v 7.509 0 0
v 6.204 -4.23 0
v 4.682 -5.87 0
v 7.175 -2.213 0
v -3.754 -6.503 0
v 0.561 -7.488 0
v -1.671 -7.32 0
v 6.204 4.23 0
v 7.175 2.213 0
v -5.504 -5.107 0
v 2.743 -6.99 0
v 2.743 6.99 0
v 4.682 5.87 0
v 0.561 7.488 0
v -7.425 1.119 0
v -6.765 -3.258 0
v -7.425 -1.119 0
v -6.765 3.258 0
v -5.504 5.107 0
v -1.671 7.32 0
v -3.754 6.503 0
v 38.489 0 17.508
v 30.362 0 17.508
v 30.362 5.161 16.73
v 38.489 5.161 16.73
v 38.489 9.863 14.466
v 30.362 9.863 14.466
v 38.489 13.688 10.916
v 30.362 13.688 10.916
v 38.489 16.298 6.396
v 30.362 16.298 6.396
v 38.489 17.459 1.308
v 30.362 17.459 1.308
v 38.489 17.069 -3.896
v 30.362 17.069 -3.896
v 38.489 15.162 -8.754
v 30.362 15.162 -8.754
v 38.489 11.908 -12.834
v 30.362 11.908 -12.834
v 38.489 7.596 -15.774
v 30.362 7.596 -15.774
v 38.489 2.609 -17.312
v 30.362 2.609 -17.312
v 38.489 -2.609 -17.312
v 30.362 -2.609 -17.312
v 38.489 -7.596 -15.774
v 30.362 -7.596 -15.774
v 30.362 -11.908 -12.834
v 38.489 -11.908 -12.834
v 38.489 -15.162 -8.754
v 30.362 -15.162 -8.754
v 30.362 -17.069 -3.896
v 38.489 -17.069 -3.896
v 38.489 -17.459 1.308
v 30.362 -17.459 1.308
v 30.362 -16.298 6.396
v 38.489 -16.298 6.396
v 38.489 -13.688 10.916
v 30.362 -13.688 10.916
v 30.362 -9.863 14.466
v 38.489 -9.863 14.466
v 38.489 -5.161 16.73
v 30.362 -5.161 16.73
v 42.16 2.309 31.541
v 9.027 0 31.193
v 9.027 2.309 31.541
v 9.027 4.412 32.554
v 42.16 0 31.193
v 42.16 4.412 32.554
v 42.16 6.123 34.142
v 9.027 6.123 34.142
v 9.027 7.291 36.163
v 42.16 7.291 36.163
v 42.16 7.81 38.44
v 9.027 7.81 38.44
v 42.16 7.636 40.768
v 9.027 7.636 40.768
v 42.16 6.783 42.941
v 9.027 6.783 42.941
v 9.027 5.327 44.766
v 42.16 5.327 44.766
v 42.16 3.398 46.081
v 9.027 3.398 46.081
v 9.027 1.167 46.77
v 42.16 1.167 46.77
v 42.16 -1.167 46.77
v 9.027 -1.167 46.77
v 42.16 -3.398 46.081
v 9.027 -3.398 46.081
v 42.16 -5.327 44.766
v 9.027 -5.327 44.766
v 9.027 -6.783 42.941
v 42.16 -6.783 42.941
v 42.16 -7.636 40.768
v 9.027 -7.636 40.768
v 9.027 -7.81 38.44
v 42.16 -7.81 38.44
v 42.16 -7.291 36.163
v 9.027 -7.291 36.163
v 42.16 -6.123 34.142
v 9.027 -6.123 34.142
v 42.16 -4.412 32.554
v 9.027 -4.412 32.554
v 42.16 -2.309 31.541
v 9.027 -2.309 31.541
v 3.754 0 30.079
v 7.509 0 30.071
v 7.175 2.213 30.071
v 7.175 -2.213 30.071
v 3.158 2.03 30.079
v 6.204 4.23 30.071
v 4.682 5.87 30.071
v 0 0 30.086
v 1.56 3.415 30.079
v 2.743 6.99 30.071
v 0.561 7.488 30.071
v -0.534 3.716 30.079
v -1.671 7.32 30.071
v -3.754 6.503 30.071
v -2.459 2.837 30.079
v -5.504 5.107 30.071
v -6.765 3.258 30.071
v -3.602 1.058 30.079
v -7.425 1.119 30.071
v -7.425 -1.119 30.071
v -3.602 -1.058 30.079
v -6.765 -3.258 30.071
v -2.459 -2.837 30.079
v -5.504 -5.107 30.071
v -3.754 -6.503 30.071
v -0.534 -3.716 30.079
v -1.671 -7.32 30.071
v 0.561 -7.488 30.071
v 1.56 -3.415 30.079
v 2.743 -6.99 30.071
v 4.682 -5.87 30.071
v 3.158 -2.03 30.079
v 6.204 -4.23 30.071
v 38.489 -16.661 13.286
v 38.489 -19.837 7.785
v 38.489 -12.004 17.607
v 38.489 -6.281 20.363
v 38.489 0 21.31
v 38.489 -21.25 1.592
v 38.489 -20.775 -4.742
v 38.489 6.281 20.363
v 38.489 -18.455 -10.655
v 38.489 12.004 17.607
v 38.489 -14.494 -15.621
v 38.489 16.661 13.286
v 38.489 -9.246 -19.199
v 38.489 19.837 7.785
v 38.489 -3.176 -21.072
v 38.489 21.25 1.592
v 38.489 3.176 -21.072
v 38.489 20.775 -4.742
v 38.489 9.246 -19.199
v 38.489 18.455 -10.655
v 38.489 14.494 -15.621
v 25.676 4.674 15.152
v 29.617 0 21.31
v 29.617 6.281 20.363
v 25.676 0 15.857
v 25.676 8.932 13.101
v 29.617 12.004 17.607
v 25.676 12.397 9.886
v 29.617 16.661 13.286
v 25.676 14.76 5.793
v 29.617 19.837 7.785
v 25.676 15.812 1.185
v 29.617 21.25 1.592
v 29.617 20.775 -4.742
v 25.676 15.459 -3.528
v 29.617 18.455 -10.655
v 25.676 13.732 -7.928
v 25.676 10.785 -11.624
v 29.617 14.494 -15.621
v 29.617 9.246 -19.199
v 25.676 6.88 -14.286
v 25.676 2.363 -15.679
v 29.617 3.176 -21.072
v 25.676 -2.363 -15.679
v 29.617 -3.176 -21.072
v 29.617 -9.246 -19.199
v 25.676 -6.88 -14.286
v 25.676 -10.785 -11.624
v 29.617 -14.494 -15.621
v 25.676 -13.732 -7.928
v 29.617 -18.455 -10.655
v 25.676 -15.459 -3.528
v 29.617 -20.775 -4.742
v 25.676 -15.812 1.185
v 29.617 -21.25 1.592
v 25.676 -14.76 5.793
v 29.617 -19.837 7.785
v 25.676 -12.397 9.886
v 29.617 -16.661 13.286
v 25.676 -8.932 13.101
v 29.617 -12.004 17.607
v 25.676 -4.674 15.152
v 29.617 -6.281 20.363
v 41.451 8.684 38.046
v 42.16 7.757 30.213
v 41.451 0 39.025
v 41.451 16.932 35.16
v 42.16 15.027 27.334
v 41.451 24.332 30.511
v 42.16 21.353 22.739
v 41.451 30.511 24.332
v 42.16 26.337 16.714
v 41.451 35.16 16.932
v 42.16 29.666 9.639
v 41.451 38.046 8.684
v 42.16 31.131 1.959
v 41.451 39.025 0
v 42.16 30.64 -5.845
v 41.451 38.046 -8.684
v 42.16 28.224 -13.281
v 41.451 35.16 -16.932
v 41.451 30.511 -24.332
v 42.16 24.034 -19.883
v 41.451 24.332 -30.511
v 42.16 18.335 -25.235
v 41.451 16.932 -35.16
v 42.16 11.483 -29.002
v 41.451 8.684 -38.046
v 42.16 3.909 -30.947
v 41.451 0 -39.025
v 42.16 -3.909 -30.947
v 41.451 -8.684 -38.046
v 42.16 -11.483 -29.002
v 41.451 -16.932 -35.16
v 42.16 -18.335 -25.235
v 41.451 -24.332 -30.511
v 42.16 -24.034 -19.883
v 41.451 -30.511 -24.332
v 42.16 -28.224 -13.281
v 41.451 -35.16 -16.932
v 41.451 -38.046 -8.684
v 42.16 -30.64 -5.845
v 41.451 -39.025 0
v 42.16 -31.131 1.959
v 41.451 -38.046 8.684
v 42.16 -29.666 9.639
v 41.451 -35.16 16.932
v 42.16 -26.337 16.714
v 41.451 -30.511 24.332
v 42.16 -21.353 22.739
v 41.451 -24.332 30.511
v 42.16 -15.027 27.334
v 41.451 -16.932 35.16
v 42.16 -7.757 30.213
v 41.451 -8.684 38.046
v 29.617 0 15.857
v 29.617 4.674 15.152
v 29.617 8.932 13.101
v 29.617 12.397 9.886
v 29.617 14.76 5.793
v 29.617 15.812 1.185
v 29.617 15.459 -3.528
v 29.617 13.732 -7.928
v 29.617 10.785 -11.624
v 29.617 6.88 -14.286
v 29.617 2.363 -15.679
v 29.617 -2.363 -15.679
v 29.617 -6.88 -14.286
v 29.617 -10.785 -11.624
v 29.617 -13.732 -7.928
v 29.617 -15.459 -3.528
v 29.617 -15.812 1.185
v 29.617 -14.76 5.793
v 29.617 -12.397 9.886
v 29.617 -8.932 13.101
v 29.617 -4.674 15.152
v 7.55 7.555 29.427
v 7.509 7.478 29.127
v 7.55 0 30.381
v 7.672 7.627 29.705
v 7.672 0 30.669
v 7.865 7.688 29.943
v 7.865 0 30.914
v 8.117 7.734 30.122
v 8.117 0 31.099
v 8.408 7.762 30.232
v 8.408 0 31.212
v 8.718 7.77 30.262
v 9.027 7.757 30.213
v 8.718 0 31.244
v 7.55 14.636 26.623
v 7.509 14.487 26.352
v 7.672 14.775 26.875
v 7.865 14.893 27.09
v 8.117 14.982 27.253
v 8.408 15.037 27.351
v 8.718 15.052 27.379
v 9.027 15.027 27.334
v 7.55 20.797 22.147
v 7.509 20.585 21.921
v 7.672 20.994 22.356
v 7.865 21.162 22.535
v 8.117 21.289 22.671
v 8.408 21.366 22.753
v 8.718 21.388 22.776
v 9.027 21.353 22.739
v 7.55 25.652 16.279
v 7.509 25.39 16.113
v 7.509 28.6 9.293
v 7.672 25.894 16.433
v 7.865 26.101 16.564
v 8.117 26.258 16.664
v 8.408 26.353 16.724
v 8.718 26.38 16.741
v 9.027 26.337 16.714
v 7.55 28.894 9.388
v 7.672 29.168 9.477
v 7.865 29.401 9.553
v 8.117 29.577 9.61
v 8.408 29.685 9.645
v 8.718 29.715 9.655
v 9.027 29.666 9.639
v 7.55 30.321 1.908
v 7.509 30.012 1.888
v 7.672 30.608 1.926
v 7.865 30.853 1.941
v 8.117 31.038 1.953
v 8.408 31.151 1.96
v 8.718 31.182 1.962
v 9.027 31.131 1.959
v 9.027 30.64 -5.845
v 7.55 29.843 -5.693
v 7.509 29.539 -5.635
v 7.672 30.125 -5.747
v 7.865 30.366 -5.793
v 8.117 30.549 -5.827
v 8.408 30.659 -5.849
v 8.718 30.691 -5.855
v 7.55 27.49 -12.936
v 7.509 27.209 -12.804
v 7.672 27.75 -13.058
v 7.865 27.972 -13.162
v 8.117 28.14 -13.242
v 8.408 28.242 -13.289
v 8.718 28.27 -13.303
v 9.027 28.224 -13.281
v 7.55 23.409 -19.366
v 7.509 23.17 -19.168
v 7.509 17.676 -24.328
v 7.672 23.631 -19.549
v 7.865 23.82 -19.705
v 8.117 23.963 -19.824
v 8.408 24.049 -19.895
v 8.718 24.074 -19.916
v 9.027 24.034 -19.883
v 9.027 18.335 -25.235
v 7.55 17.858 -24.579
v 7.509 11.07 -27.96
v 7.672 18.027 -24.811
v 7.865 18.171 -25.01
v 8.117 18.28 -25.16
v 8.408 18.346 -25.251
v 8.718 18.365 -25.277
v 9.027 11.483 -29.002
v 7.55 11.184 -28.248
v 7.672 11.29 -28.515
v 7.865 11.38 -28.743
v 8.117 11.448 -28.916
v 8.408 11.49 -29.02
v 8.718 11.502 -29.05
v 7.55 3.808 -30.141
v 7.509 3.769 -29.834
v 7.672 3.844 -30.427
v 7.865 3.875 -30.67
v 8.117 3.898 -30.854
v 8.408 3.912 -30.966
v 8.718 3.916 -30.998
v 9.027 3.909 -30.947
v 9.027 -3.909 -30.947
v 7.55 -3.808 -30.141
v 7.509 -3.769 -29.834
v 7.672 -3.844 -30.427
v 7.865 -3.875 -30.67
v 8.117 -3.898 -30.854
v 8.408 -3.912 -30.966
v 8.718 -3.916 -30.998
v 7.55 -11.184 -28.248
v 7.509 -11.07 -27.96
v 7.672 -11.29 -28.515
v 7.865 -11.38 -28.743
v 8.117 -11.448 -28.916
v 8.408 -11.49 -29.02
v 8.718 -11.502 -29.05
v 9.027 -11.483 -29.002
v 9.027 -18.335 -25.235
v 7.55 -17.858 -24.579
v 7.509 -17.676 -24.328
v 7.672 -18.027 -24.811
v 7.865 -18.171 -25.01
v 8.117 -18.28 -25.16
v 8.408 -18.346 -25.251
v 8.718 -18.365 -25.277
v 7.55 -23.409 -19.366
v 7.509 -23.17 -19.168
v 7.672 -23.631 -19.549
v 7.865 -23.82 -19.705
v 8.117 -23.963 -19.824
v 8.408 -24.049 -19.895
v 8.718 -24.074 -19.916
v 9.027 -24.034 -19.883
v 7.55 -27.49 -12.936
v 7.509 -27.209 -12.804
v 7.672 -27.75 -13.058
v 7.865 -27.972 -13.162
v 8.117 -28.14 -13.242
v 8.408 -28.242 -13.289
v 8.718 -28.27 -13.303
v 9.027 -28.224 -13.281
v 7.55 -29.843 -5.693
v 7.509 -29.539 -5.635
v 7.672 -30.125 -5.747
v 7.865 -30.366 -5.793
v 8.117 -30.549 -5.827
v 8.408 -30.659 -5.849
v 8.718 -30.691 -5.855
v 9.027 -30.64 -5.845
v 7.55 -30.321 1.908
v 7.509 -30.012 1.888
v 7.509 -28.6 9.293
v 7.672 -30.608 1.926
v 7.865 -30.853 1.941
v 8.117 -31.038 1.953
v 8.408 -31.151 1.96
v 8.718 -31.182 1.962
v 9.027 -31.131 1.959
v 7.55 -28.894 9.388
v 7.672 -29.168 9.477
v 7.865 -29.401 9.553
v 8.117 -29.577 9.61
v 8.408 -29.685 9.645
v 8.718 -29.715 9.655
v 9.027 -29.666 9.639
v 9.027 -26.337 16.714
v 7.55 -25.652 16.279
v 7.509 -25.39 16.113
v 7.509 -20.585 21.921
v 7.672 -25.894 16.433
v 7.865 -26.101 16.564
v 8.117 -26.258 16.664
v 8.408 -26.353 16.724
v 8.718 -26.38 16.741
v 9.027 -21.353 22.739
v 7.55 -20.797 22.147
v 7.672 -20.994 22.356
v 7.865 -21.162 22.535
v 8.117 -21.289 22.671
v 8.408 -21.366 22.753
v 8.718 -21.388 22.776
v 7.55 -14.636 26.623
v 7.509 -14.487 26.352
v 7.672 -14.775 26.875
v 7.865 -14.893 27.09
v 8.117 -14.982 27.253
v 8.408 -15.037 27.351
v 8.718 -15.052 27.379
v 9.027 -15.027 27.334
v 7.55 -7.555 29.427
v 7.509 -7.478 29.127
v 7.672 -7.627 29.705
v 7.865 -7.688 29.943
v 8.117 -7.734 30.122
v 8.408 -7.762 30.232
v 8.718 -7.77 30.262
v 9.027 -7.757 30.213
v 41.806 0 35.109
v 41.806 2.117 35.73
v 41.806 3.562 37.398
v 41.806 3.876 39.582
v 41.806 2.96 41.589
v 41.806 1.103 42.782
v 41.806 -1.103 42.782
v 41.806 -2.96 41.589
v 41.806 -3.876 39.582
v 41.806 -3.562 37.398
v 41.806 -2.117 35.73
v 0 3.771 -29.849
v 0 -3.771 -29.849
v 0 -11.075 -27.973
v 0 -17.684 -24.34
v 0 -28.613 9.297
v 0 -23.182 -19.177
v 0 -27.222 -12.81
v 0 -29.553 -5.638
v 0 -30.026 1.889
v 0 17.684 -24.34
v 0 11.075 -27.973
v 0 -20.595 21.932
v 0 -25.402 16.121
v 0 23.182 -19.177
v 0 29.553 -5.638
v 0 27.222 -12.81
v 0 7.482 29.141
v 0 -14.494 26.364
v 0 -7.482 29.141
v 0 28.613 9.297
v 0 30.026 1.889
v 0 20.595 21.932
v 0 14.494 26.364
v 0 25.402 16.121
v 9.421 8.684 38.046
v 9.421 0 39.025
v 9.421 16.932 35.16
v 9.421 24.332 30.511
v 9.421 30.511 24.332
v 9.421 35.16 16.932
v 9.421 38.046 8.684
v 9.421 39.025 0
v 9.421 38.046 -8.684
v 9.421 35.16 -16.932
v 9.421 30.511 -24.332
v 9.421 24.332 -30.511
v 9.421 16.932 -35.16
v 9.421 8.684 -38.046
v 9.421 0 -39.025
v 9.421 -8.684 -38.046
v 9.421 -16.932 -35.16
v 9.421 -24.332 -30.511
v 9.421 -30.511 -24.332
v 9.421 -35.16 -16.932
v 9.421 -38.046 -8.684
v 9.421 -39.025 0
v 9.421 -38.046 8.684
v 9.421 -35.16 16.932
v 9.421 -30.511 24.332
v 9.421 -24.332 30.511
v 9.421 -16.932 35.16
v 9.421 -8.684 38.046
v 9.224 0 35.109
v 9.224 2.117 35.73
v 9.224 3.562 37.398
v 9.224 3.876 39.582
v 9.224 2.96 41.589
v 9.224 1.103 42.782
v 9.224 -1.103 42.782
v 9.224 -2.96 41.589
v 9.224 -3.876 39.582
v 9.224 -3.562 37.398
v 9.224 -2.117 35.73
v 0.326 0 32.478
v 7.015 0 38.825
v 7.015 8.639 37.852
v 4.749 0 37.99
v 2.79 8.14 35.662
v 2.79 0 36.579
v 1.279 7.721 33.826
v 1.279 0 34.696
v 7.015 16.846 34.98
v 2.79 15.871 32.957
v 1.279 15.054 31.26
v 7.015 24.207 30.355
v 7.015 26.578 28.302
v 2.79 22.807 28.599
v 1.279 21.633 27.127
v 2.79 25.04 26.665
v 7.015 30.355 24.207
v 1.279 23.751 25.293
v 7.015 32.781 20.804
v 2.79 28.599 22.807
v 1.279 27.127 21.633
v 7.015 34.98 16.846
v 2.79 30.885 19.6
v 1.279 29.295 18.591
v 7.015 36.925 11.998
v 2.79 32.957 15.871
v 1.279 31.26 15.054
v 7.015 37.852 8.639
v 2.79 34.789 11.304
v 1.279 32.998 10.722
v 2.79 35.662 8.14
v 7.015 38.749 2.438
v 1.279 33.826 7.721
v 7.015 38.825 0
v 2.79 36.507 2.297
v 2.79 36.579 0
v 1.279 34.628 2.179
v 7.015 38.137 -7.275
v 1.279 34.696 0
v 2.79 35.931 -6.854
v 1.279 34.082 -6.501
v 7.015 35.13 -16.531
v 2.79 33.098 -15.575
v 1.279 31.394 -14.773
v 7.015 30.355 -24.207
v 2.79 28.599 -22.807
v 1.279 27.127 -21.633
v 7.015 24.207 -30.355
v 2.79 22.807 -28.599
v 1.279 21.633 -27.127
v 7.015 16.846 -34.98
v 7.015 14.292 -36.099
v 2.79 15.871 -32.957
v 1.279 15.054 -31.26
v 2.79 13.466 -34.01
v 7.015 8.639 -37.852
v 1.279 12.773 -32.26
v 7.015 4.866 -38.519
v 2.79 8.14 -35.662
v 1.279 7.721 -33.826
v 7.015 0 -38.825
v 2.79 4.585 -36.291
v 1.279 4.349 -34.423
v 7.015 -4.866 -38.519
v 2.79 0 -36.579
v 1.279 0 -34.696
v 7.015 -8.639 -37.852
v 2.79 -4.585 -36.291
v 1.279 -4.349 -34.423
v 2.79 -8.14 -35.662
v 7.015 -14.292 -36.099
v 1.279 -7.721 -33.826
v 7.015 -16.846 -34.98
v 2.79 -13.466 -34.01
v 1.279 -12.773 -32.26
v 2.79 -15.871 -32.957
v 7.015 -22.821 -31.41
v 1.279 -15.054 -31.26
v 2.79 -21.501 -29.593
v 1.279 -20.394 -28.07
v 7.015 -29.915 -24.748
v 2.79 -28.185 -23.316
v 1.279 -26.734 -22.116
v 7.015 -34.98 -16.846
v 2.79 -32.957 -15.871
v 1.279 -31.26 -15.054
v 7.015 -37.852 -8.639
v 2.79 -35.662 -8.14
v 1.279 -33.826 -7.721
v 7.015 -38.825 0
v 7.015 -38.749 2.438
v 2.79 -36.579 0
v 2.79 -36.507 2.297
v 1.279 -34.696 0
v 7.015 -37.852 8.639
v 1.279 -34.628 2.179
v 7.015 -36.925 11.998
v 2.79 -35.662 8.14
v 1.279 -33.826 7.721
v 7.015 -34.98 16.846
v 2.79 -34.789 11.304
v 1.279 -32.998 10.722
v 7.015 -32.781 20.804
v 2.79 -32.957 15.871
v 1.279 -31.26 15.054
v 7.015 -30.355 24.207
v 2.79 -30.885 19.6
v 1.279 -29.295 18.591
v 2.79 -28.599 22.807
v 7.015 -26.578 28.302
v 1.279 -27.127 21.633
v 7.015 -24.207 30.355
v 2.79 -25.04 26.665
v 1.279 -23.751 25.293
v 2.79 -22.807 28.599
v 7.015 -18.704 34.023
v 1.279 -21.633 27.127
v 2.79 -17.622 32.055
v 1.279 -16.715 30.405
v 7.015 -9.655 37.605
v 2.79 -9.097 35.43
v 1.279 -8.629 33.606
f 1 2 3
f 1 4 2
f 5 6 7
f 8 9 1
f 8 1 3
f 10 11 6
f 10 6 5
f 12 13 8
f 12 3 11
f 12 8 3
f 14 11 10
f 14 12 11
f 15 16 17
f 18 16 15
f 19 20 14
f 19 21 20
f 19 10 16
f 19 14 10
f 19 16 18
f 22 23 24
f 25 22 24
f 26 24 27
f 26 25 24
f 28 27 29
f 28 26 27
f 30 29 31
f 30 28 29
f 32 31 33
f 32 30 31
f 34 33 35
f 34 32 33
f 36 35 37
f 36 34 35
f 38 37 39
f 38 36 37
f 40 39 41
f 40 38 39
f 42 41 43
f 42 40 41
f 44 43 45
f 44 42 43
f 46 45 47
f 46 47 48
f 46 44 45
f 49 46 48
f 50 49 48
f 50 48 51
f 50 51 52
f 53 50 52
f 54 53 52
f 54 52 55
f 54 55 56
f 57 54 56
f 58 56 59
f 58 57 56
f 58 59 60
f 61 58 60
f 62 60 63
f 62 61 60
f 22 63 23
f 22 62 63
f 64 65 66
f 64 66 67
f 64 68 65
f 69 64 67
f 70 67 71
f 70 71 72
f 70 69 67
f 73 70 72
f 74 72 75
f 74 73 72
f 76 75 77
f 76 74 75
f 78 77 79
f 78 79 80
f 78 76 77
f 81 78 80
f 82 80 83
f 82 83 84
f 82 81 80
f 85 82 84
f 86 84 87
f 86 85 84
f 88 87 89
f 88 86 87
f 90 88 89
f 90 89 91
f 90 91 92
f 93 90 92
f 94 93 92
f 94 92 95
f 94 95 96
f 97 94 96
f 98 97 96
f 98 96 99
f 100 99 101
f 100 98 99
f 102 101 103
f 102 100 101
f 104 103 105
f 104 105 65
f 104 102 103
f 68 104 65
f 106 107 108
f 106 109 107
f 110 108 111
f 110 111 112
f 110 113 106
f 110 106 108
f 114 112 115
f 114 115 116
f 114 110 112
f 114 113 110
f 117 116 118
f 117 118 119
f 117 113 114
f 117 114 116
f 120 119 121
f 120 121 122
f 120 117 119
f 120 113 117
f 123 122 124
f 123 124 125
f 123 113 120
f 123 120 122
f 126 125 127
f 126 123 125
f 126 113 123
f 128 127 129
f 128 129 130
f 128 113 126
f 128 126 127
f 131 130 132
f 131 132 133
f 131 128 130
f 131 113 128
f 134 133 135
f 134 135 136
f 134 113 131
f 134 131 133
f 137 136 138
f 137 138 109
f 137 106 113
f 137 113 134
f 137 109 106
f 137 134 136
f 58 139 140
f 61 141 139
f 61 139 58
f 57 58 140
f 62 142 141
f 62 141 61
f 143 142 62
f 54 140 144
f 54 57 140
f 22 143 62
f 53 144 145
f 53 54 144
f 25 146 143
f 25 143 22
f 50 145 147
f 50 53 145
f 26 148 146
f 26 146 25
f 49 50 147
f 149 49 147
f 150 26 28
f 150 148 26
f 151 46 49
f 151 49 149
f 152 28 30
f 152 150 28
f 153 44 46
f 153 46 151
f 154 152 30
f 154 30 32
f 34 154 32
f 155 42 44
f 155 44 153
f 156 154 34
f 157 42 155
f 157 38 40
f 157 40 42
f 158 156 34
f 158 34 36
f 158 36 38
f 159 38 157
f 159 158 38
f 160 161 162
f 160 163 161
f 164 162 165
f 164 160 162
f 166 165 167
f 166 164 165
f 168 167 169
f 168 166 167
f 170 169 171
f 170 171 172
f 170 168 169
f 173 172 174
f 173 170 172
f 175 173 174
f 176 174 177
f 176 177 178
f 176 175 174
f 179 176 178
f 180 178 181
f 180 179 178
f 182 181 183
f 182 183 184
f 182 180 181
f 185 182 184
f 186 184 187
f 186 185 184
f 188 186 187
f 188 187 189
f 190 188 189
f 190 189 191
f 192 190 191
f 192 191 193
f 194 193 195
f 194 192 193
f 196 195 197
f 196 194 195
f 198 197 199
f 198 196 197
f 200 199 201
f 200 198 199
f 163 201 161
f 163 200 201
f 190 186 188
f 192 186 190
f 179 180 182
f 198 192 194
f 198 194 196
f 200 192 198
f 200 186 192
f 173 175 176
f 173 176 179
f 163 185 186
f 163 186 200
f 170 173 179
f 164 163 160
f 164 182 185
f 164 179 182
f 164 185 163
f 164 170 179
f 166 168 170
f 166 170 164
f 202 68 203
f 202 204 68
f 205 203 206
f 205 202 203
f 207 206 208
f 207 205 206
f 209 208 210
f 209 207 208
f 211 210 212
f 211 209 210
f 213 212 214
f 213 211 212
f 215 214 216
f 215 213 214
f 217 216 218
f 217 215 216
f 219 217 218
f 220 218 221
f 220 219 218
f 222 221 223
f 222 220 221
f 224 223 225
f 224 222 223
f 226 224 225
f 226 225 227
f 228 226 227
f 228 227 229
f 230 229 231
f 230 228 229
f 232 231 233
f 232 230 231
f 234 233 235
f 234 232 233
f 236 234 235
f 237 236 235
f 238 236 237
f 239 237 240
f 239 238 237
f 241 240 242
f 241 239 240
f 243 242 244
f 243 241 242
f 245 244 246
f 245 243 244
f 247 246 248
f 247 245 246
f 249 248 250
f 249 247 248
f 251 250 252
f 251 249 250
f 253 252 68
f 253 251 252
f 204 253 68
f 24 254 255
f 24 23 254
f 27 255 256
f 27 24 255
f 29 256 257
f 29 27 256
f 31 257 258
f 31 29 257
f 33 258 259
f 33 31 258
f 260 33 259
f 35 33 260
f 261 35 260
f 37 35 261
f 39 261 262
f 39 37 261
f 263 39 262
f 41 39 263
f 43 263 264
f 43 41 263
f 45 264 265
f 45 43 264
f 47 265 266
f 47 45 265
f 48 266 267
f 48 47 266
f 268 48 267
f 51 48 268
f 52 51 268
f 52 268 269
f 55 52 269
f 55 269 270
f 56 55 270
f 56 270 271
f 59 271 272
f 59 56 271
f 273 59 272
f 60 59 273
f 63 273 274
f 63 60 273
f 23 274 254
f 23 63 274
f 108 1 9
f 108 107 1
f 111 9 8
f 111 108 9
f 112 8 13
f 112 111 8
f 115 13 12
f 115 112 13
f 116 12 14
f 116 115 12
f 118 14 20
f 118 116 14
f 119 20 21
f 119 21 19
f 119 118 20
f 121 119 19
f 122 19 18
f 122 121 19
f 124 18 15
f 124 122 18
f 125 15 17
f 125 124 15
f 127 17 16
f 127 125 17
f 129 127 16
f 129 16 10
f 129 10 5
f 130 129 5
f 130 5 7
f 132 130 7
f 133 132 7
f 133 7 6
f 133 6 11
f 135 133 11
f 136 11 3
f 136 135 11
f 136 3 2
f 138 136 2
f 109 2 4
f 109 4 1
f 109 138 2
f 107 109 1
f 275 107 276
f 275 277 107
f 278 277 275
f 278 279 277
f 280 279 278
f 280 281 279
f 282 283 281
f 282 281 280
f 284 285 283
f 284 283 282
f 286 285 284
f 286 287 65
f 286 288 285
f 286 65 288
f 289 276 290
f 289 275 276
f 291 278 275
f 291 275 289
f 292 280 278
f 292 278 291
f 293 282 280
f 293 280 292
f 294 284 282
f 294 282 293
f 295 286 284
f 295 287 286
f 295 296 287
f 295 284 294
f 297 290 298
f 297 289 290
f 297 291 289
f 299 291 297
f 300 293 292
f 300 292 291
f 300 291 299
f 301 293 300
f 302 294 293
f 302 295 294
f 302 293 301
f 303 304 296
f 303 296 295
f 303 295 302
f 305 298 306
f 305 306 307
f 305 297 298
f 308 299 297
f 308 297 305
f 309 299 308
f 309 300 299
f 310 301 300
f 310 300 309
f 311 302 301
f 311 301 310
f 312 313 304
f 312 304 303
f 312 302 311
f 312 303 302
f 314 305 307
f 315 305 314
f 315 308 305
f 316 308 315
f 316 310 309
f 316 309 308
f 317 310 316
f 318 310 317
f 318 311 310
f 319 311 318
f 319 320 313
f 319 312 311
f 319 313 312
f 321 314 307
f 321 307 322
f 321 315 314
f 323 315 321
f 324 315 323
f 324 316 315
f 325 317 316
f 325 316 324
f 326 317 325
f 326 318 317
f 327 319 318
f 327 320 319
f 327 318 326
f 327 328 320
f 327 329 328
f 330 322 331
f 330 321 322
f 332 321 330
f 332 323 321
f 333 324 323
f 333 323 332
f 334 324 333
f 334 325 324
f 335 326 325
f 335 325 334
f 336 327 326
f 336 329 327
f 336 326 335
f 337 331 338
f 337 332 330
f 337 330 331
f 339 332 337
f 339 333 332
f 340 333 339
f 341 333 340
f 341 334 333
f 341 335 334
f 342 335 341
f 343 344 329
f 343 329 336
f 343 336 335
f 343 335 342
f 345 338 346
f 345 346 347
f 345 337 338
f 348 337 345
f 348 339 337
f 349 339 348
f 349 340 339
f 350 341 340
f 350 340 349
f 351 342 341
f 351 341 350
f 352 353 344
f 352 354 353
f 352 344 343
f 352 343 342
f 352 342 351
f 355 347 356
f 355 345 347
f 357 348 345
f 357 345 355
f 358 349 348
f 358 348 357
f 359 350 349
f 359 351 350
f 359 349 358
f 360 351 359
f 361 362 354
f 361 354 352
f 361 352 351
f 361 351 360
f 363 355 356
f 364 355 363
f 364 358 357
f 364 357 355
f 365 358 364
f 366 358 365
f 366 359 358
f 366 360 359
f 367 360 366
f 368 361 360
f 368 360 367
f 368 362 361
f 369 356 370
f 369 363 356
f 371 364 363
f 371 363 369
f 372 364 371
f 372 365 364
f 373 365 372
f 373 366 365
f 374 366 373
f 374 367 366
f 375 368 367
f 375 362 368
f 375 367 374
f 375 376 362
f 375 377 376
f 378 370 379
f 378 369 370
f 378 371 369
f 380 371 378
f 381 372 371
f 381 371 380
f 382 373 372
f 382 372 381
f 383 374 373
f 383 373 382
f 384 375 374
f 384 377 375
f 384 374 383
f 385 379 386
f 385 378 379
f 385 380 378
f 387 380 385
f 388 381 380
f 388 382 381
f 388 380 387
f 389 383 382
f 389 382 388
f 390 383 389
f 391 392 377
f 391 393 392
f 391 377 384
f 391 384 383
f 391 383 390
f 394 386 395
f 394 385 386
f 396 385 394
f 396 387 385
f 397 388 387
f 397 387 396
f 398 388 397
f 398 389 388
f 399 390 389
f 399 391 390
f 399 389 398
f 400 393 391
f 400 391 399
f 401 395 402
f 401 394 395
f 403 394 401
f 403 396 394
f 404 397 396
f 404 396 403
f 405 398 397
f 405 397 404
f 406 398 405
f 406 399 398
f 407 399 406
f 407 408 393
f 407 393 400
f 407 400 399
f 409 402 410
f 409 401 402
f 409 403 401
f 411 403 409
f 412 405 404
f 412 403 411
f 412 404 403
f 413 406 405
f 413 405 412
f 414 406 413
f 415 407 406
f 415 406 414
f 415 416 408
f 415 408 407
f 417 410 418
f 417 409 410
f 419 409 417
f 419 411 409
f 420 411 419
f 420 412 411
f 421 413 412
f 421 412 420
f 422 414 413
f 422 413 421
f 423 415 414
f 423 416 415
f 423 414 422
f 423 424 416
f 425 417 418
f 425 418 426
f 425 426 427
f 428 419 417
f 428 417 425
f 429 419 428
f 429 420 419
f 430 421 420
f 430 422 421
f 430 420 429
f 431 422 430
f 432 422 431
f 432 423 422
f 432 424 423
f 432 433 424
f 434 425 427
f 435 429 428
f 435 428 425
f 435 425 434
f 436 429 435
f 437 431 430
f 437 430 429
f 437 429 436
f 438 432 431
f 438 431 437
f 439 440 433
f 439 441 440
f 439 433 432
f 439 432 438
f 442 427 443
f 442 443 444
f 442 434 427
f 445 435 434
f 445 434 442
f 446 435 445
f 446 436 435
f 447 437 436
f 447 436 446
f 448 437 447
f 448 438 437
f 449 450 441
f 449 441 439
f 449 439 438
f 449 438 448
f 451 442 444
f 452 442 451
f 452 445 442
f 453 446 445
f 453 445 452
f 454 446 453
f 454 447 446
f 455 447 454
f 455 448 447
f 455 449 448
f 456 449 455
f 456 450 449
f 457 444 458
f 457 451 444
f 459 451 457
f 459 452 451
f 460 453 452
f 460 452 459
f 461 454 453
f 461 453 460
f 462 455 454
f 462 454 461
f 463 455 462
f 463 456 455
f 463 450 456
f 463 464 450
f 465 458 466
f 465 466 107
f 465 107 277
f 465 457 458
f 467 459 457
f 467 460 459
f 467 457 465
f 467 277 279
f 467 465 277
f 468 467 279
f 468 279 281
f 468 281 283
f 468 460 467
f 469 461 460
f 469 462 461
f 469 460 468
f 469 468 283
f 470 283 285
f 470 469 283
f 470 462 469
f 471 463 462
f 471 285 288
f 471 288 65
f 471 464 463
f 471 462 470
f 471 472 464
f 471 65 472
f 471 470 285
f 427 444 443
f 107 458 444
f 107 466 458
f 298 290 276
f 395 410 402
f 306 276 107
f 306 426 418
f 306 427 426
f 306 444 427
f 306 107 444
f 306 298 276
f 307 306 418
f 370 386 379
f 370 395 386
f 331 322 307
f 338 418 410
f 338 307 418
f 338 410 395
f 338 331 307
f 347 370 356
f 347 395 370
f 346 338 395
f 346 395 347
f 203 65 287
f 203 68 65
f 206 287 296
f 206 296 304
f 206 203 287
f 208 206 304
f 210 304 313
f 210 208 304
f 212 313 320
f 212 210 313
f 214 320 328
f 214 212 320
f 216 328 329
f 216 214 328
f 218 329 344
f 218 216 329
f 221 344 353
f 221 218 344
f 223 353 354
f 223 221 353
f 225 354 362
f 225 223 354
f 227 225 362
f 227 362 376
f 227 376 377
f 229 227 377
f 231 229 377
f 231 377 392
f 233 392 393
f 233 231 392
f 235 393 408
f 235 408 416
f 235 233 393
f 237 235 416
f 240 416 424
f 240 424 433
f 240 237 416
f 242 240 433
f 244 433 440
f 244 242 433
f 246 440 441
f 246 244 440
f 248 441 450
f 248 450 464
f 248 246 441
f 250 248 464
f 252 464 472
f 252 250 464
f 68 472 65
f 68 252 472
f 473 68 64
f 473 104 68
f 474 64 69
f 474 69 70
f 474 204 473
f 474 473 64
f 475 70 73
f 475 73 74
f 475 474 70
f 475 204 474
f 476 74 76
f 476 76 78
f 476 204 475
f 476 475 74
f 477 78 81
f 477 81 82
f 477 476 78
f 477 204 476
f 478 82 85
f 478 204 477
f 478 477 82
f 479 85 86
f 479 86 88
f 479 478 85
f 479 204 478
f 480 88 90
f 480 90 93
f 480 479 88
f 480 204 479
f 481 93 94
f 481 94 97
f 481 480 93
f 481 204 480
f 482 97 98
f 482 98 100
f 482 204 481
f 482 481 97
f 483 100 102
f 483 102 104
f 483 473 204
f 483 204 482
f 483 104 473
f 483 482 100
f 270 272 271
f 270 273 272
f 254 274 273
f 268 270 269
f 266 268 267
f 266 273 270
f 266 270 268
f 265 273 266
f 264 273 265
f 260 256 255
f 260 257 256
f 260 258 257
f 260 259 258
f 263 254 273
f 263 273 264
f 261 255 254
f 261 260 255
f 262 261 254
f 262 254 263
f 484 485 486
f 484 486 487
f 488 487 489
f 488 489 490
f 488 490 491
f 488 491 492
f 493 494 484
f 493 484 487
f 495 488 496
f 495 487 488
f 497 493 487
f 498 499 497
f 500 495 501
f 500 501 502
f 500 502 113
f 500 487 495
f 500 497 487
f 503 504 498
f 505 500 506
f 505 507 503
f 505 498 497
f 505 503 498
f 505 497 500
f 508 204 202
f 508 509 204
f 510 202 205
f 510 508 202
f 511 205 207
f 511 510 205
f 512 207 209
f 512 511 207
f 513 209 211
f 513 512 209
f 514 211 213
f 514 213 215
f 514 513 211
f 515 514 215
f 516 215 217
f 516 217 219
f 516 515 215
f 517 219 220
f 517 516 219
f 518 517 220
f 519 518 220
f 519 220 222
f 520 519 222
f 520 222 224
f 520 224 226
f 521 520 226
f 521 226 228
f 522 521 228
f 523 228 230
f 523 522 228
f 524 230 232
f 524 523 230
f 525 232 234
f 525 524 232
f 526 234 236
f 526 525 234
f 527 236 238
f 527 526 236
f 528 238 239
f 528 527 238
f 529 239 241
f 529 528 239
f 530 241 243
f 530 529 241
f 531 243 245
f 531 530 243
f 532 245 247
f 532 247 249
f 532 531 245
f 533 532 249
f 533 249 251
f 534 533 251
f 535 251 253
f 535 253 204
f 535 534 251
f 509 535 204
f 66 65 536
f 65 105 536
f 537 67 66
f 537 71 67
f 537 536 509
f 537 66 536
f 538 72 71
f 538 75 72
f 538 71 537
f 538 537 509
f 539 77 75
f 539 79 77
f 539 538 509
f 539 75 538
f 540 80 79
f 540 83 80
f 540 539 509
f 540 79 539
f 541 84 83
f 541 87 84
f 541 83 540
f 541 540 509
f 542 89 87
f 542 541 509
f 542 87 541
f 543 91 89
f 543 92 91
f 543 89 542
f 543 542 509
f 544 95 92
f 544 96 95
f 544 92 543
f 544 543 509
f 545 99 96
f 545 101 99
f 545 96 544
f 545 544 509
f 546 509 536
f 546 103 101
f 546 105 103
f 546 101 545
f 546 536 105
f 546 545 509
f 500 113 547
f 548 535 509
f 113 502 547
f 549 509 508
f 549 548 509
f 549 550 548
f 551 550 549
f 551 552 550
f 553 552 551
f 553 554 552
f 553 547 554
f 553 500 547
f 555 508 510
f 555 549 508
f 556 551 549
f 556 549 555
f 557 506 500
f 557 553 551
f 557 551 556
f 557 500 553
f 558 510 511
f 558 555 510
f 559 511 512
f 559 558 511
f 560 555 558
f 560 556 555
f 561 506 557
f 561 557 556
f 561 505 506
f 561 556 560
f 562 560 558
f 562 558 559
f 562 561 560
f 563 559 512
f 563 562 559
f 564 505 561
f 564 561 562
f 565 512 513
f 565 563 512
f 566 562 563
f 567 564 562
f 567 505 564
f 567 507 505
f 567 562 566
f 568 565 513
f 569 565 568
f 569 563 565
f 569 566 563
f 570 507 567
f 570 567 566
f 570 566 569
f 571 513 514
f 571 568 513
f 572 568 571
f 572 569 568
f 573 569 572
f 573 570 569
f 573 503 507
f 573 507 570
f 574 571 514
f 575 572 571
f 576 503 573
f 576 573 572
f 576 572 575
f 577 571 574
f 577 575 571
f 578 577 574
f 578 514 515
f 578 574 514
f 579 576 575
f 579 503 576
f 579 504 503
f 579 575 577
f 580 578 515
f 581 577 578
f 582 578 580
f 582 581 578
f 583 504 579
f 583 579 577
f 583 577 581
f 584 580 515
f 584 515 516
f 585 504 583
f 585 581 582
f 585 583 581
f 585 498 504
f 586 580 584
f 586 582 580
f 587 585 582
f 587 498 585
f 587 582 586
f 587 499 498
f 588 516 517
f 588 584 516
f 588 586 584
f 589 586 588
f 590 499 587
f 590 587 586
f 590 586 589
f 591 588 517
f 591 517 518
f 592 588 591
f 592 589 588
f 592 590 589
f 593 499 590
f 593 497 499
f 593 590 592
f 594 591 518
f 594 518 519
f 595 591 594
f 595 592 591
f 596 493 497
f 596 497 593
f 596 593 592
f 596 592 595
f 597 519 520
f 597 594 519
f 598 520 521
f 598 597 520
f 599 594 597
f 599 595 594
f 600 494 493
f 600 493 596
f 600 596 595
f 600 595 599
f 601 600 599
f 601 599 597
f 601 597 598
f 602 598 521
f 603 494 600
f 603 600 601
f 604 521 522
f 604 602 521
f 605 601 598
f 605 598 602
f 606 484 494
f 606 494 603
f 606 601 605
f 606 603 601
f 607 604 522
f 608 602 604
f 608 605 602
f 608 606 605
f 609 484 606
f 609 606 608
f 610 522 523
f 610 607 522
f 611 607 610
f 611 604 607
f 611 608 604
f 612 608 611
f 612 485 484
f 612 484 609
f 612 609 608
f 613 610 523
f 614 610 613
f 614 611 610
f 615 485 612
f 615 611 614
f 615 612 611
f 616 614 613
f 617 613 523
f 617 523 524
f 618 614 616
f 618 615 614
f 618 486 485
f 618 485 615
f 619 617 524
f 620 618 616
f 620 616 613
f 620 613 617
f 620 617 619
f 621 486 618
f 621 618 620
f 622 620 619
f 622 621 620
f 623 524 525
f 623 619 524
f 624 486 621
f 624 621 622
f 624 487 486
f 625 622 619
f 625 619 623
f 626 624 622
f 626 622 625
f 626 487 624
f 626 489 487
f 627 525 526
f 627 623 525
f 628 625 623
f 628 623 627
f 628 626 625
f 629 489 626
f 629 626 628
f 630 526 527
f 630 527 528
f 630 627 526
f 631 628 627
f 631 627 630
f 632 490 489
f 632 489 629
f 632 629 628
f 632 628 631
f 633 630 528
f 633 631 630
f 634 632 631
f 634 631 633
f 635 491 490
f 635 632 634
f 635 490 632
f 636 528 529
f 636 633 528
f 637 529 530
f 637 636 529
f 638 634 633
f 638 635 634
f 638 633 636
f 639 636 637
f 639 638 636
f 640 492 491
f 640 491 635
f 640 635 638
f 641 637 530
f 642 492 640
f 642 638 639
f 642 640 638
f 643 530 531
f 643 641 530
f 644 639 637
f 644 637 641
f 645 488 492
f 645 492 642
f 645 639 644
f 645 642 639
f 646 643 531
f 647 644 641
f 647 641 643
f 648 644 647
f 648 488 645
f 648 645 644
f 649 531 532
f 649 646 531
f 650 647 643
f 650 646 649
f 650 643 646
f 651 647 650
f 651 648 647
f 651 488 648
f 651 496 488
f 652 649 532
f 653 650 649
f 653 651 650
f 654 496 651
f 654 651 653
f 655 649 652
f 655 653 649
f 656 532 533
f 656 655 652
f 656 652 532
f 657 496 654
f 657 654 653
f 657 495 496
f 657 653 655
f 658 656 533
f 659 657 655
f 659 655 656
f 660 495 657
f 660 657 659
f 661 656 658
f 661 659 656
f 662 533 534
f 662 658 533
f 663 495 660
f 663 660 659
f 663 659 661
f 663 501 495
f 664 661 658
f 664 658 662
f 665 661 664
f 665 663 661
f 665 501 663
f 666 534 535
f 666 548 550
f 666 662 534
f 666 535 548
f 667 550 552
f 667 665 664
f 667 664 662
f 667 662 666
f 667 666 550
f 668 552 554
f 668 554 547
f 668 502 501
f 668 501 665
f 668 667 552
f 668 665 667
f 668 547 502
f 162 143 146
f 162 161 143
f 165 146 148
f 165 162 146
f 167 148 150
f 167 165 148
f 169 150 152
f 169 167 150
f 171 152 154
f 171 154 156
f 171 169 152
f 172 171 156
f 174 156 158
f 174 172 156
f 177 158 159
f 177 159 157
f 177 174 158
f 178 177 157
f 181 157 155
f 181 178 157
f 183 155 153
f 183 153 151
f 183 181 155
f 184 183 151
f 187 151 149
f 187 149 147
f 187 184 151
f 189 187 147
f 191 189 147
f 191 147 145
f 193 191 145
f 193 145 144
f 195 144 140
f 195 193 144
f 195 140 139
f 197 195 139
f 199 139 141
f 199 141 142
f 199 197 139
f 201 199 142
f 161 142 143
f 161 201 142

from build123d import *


# Not quite as in the source:
# - the program builds the solid bodies; features that only make, move or delete a surface that nothing else refers to are left out


with BuildPart() as f1:
    # F0 (on Front) → F1 (revolve)
    with BuildSketch(Plane.XZ):
        Polygon((0, 30.0858486444), (0, 0), (7.5085829012, 0), (7.5085829012, 30.0714652985), align=None)
    revolve(axis=Axis((0, 0, 15.0429243222), (0, 0, 1)))


with BuildPart() as f2:
    # F0 (on Front) → F2 (revolve)
    with BuildSketch(Plane.XZ):
        Polygon((41.4511226118, 39.0248671174), (9.4205942005, 39.0248671174), (9.0265786275, 31.1927329749), (42.1604327857, 31.1927329749), align=None)
    revolve(axis=Axis((25.4358584061, 0, 39.0248671174), (1, 0, 0)))


with BuildPart() as f4:
    # F0 (on Front) → F4 (revolve)
    with BuildSketch(Plane.XZ):
        Polygon((25.6762634963, 15.8565379679), (25.6762634963, 0), (29.6170078218, 0), (29.6170078218, 15.8565379679), (30.3619299084, 17.5078306347), (38.4891740978, 17.5078306347), (38.4891740978, 21.3095918298), (29.6170078218, 21.3095918298), align=None)
    revolve(axis=Axis((27.646635659, 0, 0), (-1, 0, 0)))


with BuildPart() as f4b:
    # F0 (on Front) → F4, piece 2 (revolve)
    with BuildSketch(Plane.XZ):
        Polygon((0, 30.0858486444), (0, 0), (7.5085829012, 0), (7.5085829012, 30.0714652985), align=None)
        Polygon((41.4511226118, 39.0248671174), (9.4205942005, 39.0248671174), (9.0265786275, 31.1927329749), (42.1604327857, 31.1927329749), align=None)
        with BuildLine():
            ThreePointArc((9.4205942005, 39.0248671174), (2.7899273364, 36.5791845812), (0, 30.0858486444))
            Line((0, 30.0858486444), (7.5085829012, 30.0714652985))
            ThreePointArc((7.5085829012, 30.0714652985), (7.9846999977, 31.015069059), (9.0265786275, 31.1927329749))
            Line((9.0265786275, 31.1927329749), (9.4205942005, 39.0248671174))
        make_face()
    revolve(axis=Axis((27.646635659, 0, 0), (-1, 0, 0)))


solid = Compound([f1.part, f2.part, f4.part, f4b.part])
